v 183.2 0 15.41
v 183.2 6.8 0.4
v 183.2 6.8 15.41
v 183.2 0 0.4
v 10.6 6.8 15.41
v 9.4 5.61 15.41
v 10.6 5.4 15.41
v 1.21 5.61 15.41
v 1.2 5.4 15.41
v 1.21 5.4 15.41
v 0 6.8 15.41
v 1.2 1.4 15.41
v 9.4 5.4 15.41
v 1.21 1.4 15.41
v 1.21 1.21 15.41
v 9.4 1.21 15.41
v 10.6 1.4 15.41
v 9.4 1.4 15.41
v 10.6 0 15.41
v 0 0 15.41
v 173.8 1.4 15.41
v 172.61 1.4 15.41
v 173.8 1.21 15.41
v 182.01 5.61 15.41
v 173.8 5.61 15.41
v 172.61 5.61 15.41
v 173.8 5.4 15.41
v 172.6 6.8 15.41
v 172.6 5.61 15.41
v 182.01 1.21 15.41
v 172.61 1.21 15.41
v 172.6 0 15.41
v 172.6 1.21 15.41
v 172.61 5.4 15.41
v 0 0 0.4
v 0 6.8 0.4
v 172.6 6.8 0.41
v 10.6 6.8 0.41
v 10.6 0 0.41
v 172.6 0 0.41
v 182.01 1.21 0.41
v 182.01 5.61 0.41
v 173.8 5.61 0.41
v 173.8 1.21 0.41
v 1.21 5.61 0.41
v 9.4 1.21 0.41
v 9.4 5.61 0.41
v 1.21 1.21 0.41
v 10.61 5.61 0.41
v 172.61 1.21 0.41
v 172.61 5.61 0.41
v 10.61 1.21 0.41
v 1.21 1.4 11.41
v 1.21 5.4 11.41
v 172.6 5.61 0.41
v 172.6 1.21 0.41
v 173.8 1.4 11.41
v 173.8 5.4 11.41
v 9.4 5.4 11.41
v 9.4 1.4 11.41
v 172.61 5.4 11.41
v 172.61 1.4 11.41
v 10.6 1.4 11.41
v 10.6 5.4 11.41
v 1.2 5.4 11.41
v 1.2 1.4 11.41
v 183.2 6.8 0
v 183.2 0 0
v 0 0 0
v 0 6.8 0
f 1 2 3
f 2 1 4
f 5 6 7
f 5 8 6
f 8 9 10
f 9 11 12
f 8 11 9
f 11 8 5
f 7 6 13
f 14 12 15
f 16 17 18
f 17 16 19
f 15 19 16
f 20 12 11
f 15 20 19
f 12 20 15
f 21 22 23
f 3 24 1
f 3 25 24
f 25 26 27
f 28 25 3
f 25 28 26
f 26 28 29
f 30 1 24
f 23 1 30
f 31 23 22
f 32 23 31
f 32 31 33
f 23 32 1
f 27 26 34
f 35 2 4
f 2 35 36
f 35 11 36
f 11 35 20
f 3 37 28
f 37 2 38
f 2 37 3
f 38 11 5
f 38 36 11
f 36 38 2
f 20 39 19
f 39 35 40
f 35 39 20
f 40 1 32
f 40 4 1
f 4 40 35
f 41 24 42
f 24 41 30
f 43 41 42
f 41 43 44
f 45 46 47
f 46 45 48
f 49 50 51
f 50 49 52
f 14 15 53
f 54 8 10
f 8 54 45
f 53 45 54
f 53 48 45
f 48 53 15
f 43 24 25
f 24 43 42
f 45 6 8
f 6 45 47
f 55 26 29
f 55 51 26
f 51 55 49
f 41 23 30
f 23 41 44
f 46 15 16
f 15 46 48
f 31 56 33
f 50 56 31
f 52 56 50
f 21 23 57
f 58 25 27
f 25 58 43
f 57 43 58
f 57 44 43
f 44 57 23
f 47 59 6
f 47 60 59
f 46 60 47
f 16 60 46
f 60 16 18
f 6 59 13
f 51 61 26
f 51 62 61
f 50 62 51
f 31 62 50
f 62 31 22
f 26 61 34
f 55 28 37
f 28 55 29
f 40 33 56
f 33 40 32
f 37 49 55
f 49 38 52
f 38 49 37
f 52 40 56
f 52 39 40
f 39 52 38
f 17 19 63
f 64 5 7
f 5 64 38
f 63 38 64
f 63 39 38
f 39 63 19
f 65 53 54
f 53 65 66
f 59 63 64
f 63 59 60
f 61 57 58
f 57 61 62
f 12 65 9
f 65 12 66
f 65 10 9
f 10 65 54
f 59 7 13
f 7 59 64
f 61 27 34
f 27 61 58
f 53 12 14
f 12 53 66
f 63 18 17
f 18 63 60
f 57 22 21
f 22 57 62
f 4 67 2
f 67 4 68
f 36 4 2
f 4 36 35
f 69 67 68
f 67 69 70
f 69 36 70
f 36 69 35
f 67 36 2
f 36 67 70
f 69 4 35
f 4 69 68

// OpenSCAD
// file: ../../Base/Rotation.scad
// Fischertechnik Box Foundation
// Geometry Helpers Rotation

include <PlacementOptions.scad>

// getRotatedSpace(space, rotation=NoRotation)
// Rotates the space dependent on the specified rotation

function getRotatedSpace(space, rotation=NoRotation) = [
    (rotation == Rotate90 || rotation == Rotate270) ? space.y : space.x,
    (rotation == Rotate90 || rotation == Rotate270) ? space.x : space.y
];

// Rotates the given space around the fixed left lower corner
// space = the space the children needs as width/depth list [width,depth]
// rotation = 0 Rotate0 degrees, 1 Rotate90 degrees, 2 Rotate180 degrees, 3 Rotate270 degrees (equivalent to -90)

module RotateFix(space, rotation=NoRotation) {
    dy = (rotation == Rotate0 || rotation == Rotate270) ? 0 :
        (rotation == Rotate90) ? space.x :
        space.y;
    dx = (rotation < Rotate180) ? 0 :
        (rotation == Rotate180) ? space.x :
        space.y;
    
    translate([dx, dy, 0])
        rotate([0, 0, rotations[rotation]])
            children();
}
// file: ../../Base/Alignment.scad
// Fischertechnik Box Foundation
// Geometry Helpers Alignment

include <PlacementOptions.scad>

// getAlignedX(elementWidth, spaceWidth, align=AlignRight, offset=0)
// Gets the aligned X offset of an element with the given
// width in the given space.
// elementWidth = The width of the element to positon
// spaceWidth = The space where the element should be aligned
// align = 0 AlignLeft, 1 AlignCenter, 2 AlignRight
// offset = an optional offset from the aligned position. When
// aligned left or centered, then positive values are in X direction.
// When aligned right then positive values are in negative X direction.

function getAlignedX(elementWidth, spaceWidth, align=AlignRight, offset=0) =
    (align == AlignLeft) ?
        offset :
        ((align == AlignCenter) ?
        (spaceWidth - elementWidth)/2 + offset :
        spaceWidth - offset - elementWidth);

// getAlignedY(elementDepth, spaceDepth, align=AlignTop, offset=0)
// Gets the aligned Y offset of an element with the given
// depth in the given space.
// elementDepth = The depth of the element to positon
// spaceDepth = The space where the element should be aligned
// align = 0 AlignBottom, 1 AlignCenter, 2 AlignTop
// offset = an optional offset from the aligned position. When
// aligned bottom or centered, then positive values are in Y direction.
// When aligned top then positive values are in negative Y direction.

function getAlignedY(elementDepth, spaceDepth, align=AlignTop, offset=0) =
    (align == AlignBottom) ?
        offset :
        ((align == AlignCenter) ?
        (spaceDepth - elementDepth)/2 + offset :
        spaceDepth - offset - elementDepth);
// file: ../../Base/Boxes.scad
// Fischertechnik Box Foundation
// Pre-designed Boxes

use <Constants.scad>

include <PlacementOptions.scad>

box190Width = 190;
box190Depth = 130;
box130Width = 130;
box130Depth = 95;

// Values are from an original ec3 box
topBottomDifference = 1.5;
outerHeight = 40;
baseThickness = 1.8;
innerHeight = outerHeight - baseThickness;
stackExcess = 5.7;
radius = 3.5;
wallThickness = 1.5;
tolerance = 0.2;

boxWallThickness = wallThickness;
boxBaseThickness = baseThickness;
boxWebWidth = 3.0;

// getBoxWallThickness()
// Gets the wall thickness of a Fischertechnik Box
function getBoxWallThickness() = boxWallThickness;

// getBoxUsageHeight(height = 38.2)
// Gets the usable height of a Fischertechnik box
// height = Outer height of the box from the bottom to the upper edge.
function getBoxUsageHeight(height = outerHeight) = height - baseThickness - stackExcess;

// getBoxInnerHeight()
// Gets the inner height of a Fischertechnik box, including the stack excess
function getBoxInnerHeight() = innerHeight;

// getBoxBaseThickness()
// Gets the thickness of the Fischertechnik box base.
function getBoxBaseThickness() = boxBaseThickness;

// getBoxWebWidth()
// Gets the width of a box web
function getBoxWebWidth() = boxWebWidth;

// getBox190Space()
// Gets the usable inner space of a Box 190 as an x/y-list
function getBox190Space() = [
    box190Width - 2*getBoxWallThickness() - topBottomDifference, 
    box190Depth - 2*getBoxWallThickness() - topBottomDifference ];

// RoundedCornerPlate(width, depth, height, radius)
// Creates a body plate with rounded corners for a box. Used
// also to create the complete box with the hull module.
// width = Width of the plate
// depth = depth of the plate 
// height = thickness of the plate
// radius = radius of the rounded corner
module RoundedCornerPlate(width, depth, height, radius) {
    translate([radius, radius])
    hull() {
        w = width-2*radius;
        d = depth-2*radius;
        cube([w, d, height]);
        cylinder(height, r=radius, $fn=getFragments());
        translate([w, 0])
            cylinder(height, r=radius, $fn=getFragments());
        translate([w, d])
            cylinder(height, r=radius, $fn=getFragments());
        translate([0, d])
            cylinder(height, r=radius, $fn=getFragments());
    }
}

// BoxBase(width, depth)
// Creates an empty stackable Fischertechnik compatible box
// width = Outer width of the box (190, 130, ...)
// depth = Outer depth of the box (130, 95, ...)

module BoxBase(width, depth, height=outerHeight) {    
    thinPlate = 0.01;

    innerHeight = height - baseThickness;    
    
    module Body(tolerance=tolerance) {
        hull() {
            // Bottom with tolerance to fit into the original boxes when stacked
            translate([-wallThickness+tolerance, -wallThickness+tolerance, -baseThickness])
                RoundedCornerPlate(width-topBottomDifference-2*tolerance, depth-topBottomDifference-2*tolerance, thinPlate, radius);
            
            // Top
            translate([-wallThickness-topBottomDifference/2, -wallThickness-topBottomDifference/2, innerHeight-thinPlate])
                RoundedCornerPlate(width, depth, thinPlate, radius);
         }
    }

    module Cutoff() {
        hull() {
            coWidth = width - 2*wallThickness;
            coDepth = depth - 2*wallThickness;
            
            // Bottom
            RoundedCornerPlate(coWidth-topBottomDifference, coDepth-topBottomDifference, thinPlate, radius);

            // Top
            translate([-topBottomDifference/2, -topBottomDifference/2, innerHeight+thinPlate]) 
                RoundedCornerPlate(coWidth, coDepth, thinPlate, radius);
        }
    }
    
    difference() {        
        Body();
        Cutoff();
        stackOffset = innerHeight - stackExcess;
        translate([0, 0, stackOffset + baseThickness])
            Body(tolerance=0);
    }
}

// Creates the Fischertechnik empty box 130x190 mm and places it at position 0,0
// 190x130 are the outer sizes, the inner space is slightly smaller. Use getBox190Space() to get the inner sizes.
// The box is positioned that the usable inner space is at the 0,0,0 position.

module Box190() {
    BoxBase(box190Width, box190Depth);
}

// Gets the usable inner space of a Box 130 as an x/y-list
function getBox130Space() = [
    box130Width - 2*getBoxWallThickness() - topBottomDifference, 
    box130Depth - 2*getBoxWallThickness() - topBottomDifference ];

// Creates the Fischertechnik empty box 95x130 mm and places it at position 0,0
// 190x130 are the outer sizes, the inner space is slightly smaller. Use getBox190Space() to get the inner sizes.
// The box is positioned that the usable inner space is at the 0,0,0 position.

module Box130() {
    BoxBase(box130Width, box130Depth);
}

// Creates a web at the specified box walls
// corner 0 = LowerLeft, 1 = UpperLeft, 2 = UpperRight, 3 = LowerRight
// side 0 = LeftOfCorner, 1 = RightOfCorner
// distance = Distance in mm from the corner
// boxSpace = inner width and depth of the box (default: Box 190)
// webWidth = length of the web (default is 3 mms)
// webThickness = thickness of the web (default is 1 mm)
// height = Height of the web (standard is getBoxUsageHeight())
// sink = How much of the web is sunk into the wall

module BoxWeb(
    corner, 
    side, 
    distance, 
    boxSpace=getBox190Space(), 
    webWidth=getBoxWebWidth(), 
    webThickness=1.0, 
    height=getBoxUsageHeight(),
    sink = getBoxWallThickness()/2) {
    width = (corner % 2 == 0) ? 
            (side == LeftOfCorner ? webWidth : webThickness) :
            (side == LeftOfCorner ? webThickness : webWidth);

    depth = (corner % 2 == 0) ? 
            (side == RightOfCorner ? webWidth : webThickness) :
            (side == RightOfCorner ? webThickness : webWidth);
    
    xDiff = corner == LowerLeft ? 
                (side == LeftOfCorner ? -sink : distance) :
            (corner == UpperLeft ?                
                (side == LeftOfCorner ? distance : -sink) :
            (corner == UpperRight ?
                (side == LeftOfCorner ? boxSpace.x-webWidth+sink : boxSpace.x-distance-webThickness) :
                (side == LeftOfCorner ? boxSpace.x-distance-webThickness: boxSpace.x-webWidth+sink)));

    yDiff = corner == LowerLeft ? 
                (side == RightOfCorner ? -sink : distance) :
            (corner == UpperLeft ?
                (side == RightOfCorner ? boxSpace.y-distance-webThickness : boxSpace.y-webWidth+sink) :
            (corner == UpperRight ?
                (side == RightOfCorner ? boxSpace.y-webWidth+sink : boxSpace.y-distance-webThickness) :
                (side == RightOfCorner ? distance : -sink)));
    
    translate([xDiff, yDiff, -getExcess()])
        cube([width, depth, height + 2*getExcess()]);
}
// file: ../../Base/PlacementOptions.scad
// Fischertechnik Box Foundation
// Placement Options

// Alignment
NoAlign = 0;
AlignLeft = 1;
AlignBottom = 2;
AlignCenter = 3;
AlignRight = 4;
AlignTop = 5;

// Element rotation degree steps
rotations = [0, -90, -180, -270];

// Rotation
NoRotation = 0;
Rotate0 = 0;
Rotate90 = 1;
Rotate180 = 2;
Rotate270 = 3;

// Docking (seen from above)
NoDock = -1;
DockLeft = 0;
DockTop = 1;
DockRight = 2;
DockCorner = 2;
DockBottom = 3;

// Web corners
LowerLeft = 0;
UpperLeft = 1;
UpperRight = 2;
LowerRight = 3;

// Web position relative to corner
LeftOfCorner = 0;
RightOfCorner = 1;

// Rails direction
Horizontal = true;
Vertical = false;
// file: ../../Base/Placement.scad
// Fischertechnik Box Foundation
// Geometry Helpers Placement

use <Constants.scad>
use <Alignment.scad>
use <Rotation.scad>
use <Boxes.scad>

include <PlacementOptions.scad>

// Place(x=0, y=0, elementSpace=[0,0], alignX=AlignLeft, alignY=AlignBottom, rotation=Rotate0, boxSpace=getBox190Space())
// Places the child at the specified position
// y = Y-Position. This is a relative position when an X aligment is specified.
// x = X-Position. This is a relative position when an Y aligment is specified.
// elementSpace = space of the element to be placed [x,y]
// alignX = -1=NoAlign, 0 AlignLeft, 1 AlignCenter, 3 AlignRight (elementSpace and boxSpace required!)
// alignY = -1=NoAlign, 2 AlignBottom, 1 AlignCenter, 4 AlignTop (elementSpace and boxSpace required!)
// rotation = 0 Rotate0 0 degrees, 1 Rotate90 90 degrees, 
// 2 Rotate180 180 degrees, 3 Rotate270 270 degrees (equivalent to -90)
// boxSpace = Inner space of the box where the placement occurs [x,y] - default is Box 190x130 inner space

module Place(x=0, y=0, elementSpace=[0,0], 
  alignX=AlignLeft, alignY=AlignBottom, 
  rotation=NoRotation, boxSpace=getBox190Space()) {

    module Position(x, y, space, rotation=Rotate0) {
        translate([x, y, 0])
            RotateFix(space, rotation)
                children();
    }

    space = getRotatedSpace(elementSpace, rotation);
    alignedX = getAlignedX(space.x, boxSpace.x, alignX, x);
    alignedY = getAlignedY(space.y, boxSpace.y, alignY, y);
    Position(alignedX, alignedY, elementSpace, rotation)
        children();
}

// Center(space=getBox130Space(), elementSpace=[0,0])
// space = Space where the children is centered. For cylinder use centered=true and no elementSpace.
// elementSpace = space of the element to be centered [x,y]

module Center(space=getBox190Space(), elementSpace=[0,0]) {
    Place(elementSpace=elementSpace, boxSpace=space, alignX=AlignCenter, alignY=AlignCenter)
        children();
}

// CenterHorizontal(width=0, y=0, offset=0, space=getBox130Space())
// width = Width of the element to be placed.
// y = Y position of the element
// offset = Offset from the center position (negative will be left of the center)
// space = Space where the element is placed

module CenterHorizontal(width=0, y=0, offset=0, space=getBox190Space()) {
    Place(x=offset, y=y, elementSpace=[width, 0], boxSpace=space, alignX=AlignCenter)
        children(0);
}

// CenterVertical(depth=0, x=0, offset=0, space=getBox130Space())
// depth = Depth of the element to be placed.
// x = X position of the element
// offset = Offset from the center position (negative will be down of the center)
// space = Space where the element is placed

module CenterVertical(depth=0, x=0, offset=0, space=getBox190Space()) {
    Place(x=x, y=offset, elementSpace=[0, depth], boxSpace=space, alignY=AlignCenter)
        children(0);
}

// getIsVertical(align)
// True if the specified alignment needs a vertical orientation for a divider (AlignRight, AlignLeft)

function getIsVertical(align) = (align == AlignRight || align == AlignLeft);

// getIsHorizontal(align)
// True if the specified alignment needs a horizontal orientation for a divider (AlignTop, AlignBottom)

function getIsHorizontal(align) = (align == AlignTop || align == AlignBottom);
// file: ../../Elements/AxisClip10.scad
// Fischertechnik Box Library
// Axis for clip 10
// 31023

use <../ModelBase/Simple.scad>
use <../Base/Constants.scad>

/* [Element Parameters] */
height = 23;
clipHeight = 10;

/* [Hidden] */
width = 12;
depth = 12;
upperDiameter = 3.6;

// getAxisClip10Space()
// Gets the space of a n axis for a clip 10 with spring ring (mot2)

function getAxisClip10Space() = [width, depth, height];

// AxisClip10(height, clipHeight)
// Axis for clip 10 with spring ring (mot2)
// height = Height of the complete axis (standard is 23, in mot3 its only 12)
// clipHeight = Height of the part for the clip (standard is 10, in mot3 its only 7)

module AxisClip10(height=height, clipHeight=clipHeight) {
    LeveledAxisWithSpace(height, height-clipHeight, getAxisClip10Space(), diameter=upperDiameter);
}

// Test
color("lightgray")
AxisClip10(height, clipHeight);
// file: ../../Base/Constants.scad
// Fischertechnik Box Foundation
// Constants

// Constant values necessary for multiple elements

// Base constants
dividerThickness = 1.2;
excess = 0.01;
fragments = 90;
tolerance = 0.8;

// Gets the thickness of a divider 
function getDividerThickness() = dividerThickness;

// Gets the excess that is used to merge walls into each other
function getExcess() = excess;

// Gets amount of fragments of a cylinder
function getFragments() = fragments;

// Gets the inner tolerance of a frame to each side
function getTolerance() = tolerance;


// Fischertechnik specific constants
axisDiameter = 4;
axisBottomDiameter = axisDiameter + 1;
axisTolerance = 0.2;
axisLockingLength = 8;

// Gets axis diameter of Fischertechnik axis
function getAxisDiameter() = axisDiameter;

// Gets axis diameter tolerance (subtracted for element axis)
function getAxisTolerance() = axisTolerance;

// Gets the axis diameter for standing axis
function getStandAxisDiameter() = getAxisDiameter() - getAxisTolerance();

// Gets axis bottom diameter for thicker part at the bottom
function getAxisBottomDiameter() = axisBottomDiameter;

// Gets the lengthh of the locking part of a locking axis
function getAxisLockingLength() = axisLockingLength;

// Studs

studHeight = 2.5;
studTolerance = 0.2;
studRailDistance = 9;   // as in ft 50

// gets the height of a connecting stud
function getStudHeight() = studHeight;

// gets the connecting stud height tolerance
function getStudTolerance() = studTolerance;

// gets the default rail distance for studs
function getStudRailDistance() = studRailDistance;

// Dockable Frame with Edge

standardEdgeDistance = 2.5;
standardWebDistance = 11.5;
standardCornerLength = 15;

// gets the standard distance to the wall of the box for dockable frames with webs
function getStandardEdgeDistance() = standardEdgeDistance;

// gets the standard distance of each web to the corner of the dockable frame
function getStandardWebDistance() = standardWebDistance;

// gets the standard length of the corner walls of a dockable frame
function getStandardCornerLength() = standardCornerLength;

// Tubes

tubeWallFactor = 0.8;

// gets the wall thickness of a tube.
function getTubeWallThickness() = tubeWallFactor * getDividerThickness();

// Small Parts and Divider Frame

smallPartsFrameHeight = 20;

// gets the frame height for docked small parts boxes.
function getSmallPartsFrameHeight() = smallPartsFrameHeight;

// Hubs

hubRingDiameter = 19.5;
hubRingLevelDiameter = 21;

// gets the diameter of a tube matching the inner ring of a wheel
function getHubRingDiameter() = hubRingDiameter;

// gets the diameter of a hub tube with a thicker diameter
function getHubRingLevelDiameter() = hubRingLevelDiameter;

// Struts

strutAddLength = 9.0;
strutDepth = 8.0;

// gets the full length of a strut
function getFullStrutLength(length) = length + strutAddLength;

// gets the radius of the end of a strut
function getStrutEndRadius() = strutAddLength / 2;

// gets the the depth of a strut
function getStrutDepth() = strutDepth;

// Propeller

propellerAxisDiameter = 7.0;
propellerAxisTolerance = 0.2;

// gets the propeller axis outer diameter
function getPropellerAxisDiameter() = propellerAxisDiameter;

// gets the propeller axis printing tolerance
function getPropellerAxisTolerance() = propellerAxisTolerance;
// file: ../../Elements/FrameAxis180.scad
// Fischertechnik Box Library
// Frame for single 180 mm Axis
// 37527

use <../ModelBase/Complex.scad>

/* [Element Parameters] */
count = 1;

/* [Hidden] */
length = 180;

// getFrameAxis180Space(count=1)
// Gets the width (.x) and depth (.y) of the axis frame.
// count = Count of axis

function getFrameAxis180Space(count) = getFrameAxisSpace(length, count);

// FrameAxis180(count=1)
// Axis holder for a single 90 mm axis.
// count = Count of axis

module FrameAxis180(count=1) {
    FrameAxis(length, count);
}

// Test
color("lightgray")
FrameAxis180(count);
// file: ../TestPrint.scad
// 3D Print Test Base

use <../Base/Constants.scad>

use <../Elements/AxisClip10.scad>

module TestPrint(elementSpace) {
    cube([elementSpace.x, elementSpace.y, 0.4]);
    translate([0,0,0.4+getExcess()]) {
        children();
    }
}

TestPrint(getAxisClip10Space())
    AxisClip10();
// main file
// 3D Print Test
// FrameAxis180

use <../TestPrint.scad>
use <../../Elements/FrameAxis180.scad>

count = 1;

TestPrint(getFrameAxis180Space(count))
    FrameAxis180(count);
